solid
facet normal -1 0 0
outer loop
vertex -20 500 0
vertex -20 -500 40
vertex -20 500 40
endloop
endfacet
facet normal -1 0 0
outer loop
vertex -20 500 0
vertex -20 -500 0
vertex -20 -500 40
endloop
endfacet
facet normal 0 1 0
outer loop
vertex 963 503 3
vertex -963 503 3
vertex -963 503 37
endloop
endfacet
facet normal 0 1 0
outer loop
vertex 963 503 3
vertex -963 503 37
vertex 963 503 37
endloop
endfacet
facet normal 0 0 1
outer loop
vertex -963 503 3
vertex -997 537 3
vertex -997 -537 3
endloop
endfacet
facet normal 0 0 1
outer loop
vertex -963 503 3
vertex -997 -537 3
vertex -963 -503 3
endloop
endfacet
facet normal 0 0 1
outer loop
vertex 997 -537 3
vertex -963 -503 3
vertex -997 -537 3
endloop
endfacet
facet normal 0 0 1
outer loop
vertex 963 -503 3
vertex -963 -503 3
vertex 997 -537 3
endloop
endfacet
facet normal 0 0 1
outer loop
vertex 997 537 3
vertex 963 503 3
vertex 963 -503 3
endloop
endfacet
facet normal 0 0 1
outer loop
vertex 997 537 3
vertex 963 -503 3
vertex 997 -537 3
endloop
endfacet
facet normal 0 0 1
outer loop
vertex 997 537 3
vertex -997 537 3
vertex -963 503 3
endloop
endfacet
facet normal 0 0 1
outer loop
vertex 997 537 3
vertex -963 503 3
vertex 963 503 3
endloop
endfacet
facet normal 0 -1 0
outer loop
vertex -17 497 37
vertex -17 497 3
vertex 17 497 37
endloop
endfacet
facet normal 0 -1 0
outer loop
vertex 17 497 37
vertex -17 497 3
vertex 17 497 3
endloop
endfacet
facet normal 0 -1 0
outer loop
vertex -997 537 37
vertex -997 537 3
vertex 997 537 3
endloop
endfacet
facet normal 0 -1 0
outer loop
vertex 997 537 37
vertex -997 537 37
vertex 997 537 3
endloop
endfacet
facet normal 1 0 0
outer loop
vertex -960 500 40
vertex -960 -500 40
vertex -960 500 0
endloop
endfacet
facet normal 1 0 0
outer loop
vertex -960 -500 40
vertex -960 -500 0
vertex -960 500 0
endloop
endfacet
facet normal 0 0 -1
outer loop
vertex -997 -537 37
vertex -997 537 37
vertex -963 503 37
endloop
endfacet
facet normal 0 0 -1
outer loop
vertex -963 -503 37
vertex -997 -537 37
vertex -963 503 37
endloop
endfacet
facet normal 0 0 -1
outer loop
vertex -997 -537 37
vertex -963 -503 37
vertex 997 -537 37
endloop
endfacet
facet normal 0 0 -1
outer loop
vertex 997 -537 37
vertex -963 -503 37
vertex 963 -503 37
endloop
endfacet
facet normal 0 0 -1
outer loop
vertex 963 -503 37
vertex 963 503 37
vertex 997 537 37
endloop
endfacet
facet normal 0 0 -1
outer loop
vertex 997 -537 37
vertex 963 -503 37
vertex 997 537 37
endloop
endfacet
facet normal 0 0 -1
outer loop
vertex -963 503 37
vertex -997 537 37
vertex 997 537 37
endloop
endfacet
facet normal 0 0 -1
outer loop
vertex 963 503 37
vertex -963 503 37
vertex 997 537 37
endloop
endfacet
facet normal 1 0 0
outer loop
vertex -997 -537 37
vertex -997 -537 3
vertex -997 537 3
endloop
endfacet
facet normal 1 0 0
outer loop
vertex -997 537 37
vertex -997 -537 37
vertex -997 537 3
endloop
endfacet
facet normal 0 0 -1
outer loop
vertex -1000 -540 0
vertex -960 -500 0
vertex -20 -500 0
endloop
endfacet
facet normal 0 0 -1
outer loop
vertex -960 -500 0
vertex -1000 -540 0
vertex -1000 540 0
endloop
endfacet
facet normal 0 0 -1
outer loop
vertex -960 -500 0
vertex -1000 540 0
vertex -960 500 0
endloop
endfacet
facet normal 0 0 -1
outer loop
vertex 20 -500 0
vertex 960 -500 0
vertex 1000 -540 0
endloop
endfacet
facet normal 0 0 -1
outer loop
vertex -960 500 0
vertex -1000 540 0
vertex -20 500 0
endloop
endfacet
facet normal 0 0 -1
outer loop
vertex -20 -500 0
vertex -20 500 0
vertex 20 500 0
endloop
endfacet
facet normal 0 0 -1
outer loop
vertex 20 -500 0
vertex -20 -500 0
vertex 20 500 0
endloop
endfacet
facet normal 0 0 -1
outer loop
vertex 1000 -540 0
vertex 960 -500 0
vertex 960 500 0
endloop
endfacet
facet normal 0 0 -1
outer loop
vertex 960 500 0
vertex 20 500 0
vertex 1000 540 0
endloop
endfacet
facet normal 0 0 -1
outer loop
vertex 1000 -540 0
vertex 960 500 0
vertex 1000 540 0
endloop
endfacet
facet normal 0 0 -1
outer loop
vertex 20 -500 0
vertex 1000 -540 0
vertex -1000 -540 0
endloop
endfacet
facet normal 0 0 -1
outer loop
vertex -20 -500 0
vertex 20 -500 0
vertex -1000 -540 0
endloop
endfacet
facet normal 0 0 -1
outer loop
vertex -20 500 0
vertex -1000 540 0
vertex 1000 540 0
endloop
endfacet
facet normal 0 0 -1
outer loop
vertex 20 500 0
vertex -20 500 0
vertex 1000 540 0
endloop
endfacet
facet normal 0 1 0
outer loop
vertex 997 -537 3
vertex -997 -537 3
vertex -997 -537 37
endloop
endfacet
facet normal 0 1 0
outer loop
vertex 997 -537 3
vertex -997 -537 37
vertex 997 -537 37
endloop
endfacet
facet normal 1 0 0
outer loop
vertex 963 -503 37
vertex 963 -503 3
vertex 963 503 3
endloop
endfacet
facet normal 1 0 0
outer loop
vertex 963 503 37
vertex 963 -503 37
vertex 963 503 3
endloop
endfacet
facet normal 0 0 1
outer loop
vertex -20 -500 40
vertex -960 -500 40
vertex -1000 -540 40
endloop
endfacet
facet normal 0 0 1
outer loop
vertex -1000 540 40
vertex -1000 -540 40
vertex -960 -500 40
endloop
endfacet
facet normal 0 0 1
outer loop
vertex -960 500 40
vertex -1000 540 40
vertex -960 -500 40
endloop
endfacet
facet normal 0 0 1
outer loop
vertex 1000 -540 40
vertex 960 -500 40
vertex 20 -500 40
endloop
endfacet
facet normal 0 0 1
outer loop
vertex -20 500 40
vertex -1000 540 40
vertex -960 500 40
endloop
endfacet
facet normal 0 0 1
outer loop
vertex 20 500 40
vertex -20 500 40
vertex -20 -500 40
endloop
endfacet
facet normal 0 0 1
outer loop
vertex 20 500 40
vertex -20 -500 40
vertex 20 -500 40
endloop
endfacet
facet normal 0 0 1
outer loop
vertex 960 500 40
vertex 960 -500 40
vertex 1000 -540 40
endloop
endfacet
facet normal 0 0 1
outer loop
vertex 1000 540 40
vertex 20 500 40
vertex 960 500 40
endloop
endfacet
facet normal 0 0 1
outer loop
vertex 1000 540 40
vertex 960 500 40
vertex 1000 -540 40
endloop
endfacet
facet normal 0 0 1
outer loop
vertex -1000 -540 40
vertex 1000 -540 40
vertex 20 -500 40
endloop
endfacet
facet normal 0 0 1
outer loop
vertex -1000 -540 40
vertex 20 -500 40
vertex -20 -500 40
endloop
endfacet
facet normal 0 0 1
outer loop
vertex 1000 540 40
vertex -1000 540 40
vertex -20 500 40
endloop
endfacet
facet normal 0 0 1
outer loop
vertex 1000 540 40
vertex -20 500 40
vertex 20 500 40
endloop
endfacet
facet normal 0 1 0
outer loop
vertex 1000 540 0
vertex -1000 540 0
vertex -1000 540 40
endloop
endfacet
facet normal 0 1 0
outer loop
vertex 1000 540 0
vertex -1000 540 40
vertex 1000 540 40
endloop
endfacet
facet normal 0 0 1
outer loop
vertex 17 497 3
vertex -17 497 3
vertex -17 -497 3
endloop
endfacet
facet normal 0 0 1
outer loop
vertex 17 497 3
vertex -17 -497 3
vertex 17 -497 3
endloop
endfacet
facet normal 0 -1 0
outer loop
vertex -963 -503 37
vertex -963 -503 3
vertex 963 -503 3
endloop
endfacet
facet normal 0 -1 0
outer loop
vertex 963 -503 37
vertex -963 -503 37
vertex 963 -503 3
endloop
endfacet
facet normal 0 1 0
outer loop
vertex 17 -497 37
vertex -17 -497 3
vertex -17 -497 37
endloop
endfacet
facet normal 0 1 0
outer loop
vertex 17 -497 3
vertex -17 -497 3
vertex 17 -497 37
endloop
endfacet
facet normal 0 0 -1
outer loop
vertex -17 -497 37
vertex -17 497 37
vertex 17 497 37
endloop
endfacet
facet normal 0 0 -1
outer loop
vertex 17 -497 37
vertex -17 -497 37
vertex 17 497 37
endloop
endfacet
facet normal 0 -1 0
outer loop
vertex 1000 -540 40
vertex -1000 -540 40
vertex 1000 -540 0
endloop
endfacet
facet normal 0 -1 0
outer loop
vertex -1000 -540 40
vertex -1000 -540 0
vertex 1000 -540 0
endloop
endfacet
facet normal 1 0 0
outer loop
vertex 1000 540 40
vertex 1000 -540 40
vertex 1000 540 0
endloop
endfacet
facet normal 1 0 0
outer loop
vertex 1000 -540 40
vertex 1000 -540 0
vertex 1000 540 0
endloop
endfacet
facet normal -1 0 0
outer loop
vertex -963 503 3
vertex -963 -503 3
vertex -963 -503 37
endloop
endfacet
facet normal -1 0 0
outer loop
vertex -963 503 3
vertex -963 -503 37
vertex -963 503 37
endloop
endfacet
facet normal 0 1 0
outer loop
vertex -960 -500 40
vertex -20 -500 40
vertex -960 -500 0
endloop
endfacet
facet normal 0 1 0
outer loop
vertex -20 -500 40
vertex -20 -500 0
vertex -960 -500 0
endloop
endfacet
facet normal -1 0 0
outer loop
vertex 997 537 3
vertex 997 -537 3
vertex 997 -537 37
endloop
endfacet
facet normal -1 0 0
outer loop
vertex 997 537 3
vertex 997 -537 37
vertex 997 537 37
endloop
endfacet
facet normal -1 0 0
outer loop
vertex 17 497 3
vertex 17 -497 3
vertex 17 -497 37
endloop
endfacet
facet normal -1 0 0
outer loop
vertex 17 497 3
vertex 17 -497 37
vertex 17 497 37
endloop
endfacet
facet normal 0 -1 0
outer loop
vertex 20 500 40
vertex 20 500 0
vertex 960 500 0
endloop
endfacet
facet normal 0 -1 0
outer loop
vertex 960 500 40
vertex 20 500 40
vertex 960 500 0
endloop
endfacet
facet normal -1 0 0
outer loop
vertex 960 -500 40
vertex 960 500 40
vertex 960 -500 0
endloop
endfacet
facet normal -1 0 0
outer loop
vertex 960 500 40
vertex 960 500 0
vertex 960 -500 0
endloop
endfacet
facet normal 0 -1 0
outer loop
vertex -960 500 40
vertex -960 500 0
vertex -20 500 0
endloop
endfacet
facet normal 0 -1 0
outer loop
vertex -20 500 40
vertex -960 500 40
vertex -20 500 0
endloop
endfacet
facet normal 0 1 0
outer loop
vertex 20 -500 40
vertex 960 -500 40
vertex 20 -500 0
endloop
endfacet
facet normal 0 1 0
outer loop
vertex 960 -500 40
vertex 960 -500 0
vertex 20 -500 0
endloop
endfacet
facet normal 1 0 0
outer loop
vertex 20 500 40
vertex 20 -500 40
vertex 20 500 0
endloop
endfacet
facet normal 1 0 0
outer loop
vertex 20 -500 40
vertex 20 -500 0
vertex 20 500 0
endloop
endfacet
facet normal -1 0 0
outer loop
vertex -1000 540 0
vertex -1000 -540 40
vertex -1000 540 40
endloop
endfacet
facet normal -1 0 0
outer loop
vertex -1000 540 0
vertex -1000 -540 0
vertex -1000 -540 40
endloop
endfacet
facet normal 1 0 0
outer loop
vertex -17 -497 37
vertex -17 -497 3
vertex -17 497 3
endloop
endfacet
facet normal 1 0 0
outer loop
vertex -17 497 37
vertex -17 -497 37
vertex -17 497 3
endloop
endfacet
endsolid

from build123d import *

# Parameters (mm, degrees)
F0_W     = 40
F0_H     = 40
F0_H_2   = 1000
F1_DEPTH = 3
F2_W     = 2000
F2_H     = 1080
F2_W_2   = 1994
F2_H_2   = 1074
F2_W_3   = 1926
F2_H_3   = 1006
F2_W_4   = 40
F2_H_4   = 1000
F2_W_5   = 34
F2_H_5   = 994
F3_DEPTH = 34
F4_W     = 2000
F4_H     = 1080
F4_W_2   = 40
F4_H_2   = 1000
F4_W_3   = 34
F4_H_3   = 994
F5_DEPTH = 3


with BuildPart() as f1:
    # F0 (on Top) → F1 (new body)
    with BuildSketch(Plane.XY):
        with Locations((0, 520)):
            Rectangle(F0_W, F0_H)
        Polygon((-20, 500), (-20, 540), (-1000, 540), (-1000, -540), (-20, -540), (-20, -500), (-960, -500), (-960, 500), align=None)
        Polygon((1000, 540), (20, 540), (20, 500), (960, 500), (960, -500), (20, -500), (20, -540), (1000, -540), align=None)
        with Locations((0, -520)):
            Rectangle(F0_W, F0_H)
        Rectangle(F0_W, F0_H_2)
    extrude(amount=F1_DEPTH)

    # F2 (on face) → F3 (join)
    with BuildSketch(Plane.XY.offset(3)):
        Rectangle(F2_W, F2_H)
        Rectangle(F2_W_2, F2_H_2, mode=Mode.SUBTRACT)
        Rectangle(F2_W_3, F2_H_3)
        Polygon((-20, 500), (20, 500), (960, 500), (960, -500), (20, -500), (-20, -500), (-960, -500), (-960, 500), align=None, mode=Mode.SUBTRACT)
        Rectangle(F2_W_4, F2_H_4)
        Rectangle(F2_W_5, F2_H_5, mode=Mode.SUBTRACT)
    extrude(amount=F3_DEPTH)

    # F4 (on face) → F5 (join)
    with BuildSketch(Plane.XY.offset(37)):
        Rectangle(F4_W, F4_H)
        Polygon((20, 500), (960, 500), (960, -500), (20, -500), (-20, -500), (-960, -500), (-960, 500), (-20, 500), align=None, mode=Mode.SUBTRACT)
        Rectangle(F4_W_2, F4_H_2)
        Rectangle(F4_W_3, F4_H_3, mode=Mode.SUBTRACT)
        Rectangle(F4_W_3, F4_H_3)
    extrude(amount=F5_DEPTH)


solid = f1.part
